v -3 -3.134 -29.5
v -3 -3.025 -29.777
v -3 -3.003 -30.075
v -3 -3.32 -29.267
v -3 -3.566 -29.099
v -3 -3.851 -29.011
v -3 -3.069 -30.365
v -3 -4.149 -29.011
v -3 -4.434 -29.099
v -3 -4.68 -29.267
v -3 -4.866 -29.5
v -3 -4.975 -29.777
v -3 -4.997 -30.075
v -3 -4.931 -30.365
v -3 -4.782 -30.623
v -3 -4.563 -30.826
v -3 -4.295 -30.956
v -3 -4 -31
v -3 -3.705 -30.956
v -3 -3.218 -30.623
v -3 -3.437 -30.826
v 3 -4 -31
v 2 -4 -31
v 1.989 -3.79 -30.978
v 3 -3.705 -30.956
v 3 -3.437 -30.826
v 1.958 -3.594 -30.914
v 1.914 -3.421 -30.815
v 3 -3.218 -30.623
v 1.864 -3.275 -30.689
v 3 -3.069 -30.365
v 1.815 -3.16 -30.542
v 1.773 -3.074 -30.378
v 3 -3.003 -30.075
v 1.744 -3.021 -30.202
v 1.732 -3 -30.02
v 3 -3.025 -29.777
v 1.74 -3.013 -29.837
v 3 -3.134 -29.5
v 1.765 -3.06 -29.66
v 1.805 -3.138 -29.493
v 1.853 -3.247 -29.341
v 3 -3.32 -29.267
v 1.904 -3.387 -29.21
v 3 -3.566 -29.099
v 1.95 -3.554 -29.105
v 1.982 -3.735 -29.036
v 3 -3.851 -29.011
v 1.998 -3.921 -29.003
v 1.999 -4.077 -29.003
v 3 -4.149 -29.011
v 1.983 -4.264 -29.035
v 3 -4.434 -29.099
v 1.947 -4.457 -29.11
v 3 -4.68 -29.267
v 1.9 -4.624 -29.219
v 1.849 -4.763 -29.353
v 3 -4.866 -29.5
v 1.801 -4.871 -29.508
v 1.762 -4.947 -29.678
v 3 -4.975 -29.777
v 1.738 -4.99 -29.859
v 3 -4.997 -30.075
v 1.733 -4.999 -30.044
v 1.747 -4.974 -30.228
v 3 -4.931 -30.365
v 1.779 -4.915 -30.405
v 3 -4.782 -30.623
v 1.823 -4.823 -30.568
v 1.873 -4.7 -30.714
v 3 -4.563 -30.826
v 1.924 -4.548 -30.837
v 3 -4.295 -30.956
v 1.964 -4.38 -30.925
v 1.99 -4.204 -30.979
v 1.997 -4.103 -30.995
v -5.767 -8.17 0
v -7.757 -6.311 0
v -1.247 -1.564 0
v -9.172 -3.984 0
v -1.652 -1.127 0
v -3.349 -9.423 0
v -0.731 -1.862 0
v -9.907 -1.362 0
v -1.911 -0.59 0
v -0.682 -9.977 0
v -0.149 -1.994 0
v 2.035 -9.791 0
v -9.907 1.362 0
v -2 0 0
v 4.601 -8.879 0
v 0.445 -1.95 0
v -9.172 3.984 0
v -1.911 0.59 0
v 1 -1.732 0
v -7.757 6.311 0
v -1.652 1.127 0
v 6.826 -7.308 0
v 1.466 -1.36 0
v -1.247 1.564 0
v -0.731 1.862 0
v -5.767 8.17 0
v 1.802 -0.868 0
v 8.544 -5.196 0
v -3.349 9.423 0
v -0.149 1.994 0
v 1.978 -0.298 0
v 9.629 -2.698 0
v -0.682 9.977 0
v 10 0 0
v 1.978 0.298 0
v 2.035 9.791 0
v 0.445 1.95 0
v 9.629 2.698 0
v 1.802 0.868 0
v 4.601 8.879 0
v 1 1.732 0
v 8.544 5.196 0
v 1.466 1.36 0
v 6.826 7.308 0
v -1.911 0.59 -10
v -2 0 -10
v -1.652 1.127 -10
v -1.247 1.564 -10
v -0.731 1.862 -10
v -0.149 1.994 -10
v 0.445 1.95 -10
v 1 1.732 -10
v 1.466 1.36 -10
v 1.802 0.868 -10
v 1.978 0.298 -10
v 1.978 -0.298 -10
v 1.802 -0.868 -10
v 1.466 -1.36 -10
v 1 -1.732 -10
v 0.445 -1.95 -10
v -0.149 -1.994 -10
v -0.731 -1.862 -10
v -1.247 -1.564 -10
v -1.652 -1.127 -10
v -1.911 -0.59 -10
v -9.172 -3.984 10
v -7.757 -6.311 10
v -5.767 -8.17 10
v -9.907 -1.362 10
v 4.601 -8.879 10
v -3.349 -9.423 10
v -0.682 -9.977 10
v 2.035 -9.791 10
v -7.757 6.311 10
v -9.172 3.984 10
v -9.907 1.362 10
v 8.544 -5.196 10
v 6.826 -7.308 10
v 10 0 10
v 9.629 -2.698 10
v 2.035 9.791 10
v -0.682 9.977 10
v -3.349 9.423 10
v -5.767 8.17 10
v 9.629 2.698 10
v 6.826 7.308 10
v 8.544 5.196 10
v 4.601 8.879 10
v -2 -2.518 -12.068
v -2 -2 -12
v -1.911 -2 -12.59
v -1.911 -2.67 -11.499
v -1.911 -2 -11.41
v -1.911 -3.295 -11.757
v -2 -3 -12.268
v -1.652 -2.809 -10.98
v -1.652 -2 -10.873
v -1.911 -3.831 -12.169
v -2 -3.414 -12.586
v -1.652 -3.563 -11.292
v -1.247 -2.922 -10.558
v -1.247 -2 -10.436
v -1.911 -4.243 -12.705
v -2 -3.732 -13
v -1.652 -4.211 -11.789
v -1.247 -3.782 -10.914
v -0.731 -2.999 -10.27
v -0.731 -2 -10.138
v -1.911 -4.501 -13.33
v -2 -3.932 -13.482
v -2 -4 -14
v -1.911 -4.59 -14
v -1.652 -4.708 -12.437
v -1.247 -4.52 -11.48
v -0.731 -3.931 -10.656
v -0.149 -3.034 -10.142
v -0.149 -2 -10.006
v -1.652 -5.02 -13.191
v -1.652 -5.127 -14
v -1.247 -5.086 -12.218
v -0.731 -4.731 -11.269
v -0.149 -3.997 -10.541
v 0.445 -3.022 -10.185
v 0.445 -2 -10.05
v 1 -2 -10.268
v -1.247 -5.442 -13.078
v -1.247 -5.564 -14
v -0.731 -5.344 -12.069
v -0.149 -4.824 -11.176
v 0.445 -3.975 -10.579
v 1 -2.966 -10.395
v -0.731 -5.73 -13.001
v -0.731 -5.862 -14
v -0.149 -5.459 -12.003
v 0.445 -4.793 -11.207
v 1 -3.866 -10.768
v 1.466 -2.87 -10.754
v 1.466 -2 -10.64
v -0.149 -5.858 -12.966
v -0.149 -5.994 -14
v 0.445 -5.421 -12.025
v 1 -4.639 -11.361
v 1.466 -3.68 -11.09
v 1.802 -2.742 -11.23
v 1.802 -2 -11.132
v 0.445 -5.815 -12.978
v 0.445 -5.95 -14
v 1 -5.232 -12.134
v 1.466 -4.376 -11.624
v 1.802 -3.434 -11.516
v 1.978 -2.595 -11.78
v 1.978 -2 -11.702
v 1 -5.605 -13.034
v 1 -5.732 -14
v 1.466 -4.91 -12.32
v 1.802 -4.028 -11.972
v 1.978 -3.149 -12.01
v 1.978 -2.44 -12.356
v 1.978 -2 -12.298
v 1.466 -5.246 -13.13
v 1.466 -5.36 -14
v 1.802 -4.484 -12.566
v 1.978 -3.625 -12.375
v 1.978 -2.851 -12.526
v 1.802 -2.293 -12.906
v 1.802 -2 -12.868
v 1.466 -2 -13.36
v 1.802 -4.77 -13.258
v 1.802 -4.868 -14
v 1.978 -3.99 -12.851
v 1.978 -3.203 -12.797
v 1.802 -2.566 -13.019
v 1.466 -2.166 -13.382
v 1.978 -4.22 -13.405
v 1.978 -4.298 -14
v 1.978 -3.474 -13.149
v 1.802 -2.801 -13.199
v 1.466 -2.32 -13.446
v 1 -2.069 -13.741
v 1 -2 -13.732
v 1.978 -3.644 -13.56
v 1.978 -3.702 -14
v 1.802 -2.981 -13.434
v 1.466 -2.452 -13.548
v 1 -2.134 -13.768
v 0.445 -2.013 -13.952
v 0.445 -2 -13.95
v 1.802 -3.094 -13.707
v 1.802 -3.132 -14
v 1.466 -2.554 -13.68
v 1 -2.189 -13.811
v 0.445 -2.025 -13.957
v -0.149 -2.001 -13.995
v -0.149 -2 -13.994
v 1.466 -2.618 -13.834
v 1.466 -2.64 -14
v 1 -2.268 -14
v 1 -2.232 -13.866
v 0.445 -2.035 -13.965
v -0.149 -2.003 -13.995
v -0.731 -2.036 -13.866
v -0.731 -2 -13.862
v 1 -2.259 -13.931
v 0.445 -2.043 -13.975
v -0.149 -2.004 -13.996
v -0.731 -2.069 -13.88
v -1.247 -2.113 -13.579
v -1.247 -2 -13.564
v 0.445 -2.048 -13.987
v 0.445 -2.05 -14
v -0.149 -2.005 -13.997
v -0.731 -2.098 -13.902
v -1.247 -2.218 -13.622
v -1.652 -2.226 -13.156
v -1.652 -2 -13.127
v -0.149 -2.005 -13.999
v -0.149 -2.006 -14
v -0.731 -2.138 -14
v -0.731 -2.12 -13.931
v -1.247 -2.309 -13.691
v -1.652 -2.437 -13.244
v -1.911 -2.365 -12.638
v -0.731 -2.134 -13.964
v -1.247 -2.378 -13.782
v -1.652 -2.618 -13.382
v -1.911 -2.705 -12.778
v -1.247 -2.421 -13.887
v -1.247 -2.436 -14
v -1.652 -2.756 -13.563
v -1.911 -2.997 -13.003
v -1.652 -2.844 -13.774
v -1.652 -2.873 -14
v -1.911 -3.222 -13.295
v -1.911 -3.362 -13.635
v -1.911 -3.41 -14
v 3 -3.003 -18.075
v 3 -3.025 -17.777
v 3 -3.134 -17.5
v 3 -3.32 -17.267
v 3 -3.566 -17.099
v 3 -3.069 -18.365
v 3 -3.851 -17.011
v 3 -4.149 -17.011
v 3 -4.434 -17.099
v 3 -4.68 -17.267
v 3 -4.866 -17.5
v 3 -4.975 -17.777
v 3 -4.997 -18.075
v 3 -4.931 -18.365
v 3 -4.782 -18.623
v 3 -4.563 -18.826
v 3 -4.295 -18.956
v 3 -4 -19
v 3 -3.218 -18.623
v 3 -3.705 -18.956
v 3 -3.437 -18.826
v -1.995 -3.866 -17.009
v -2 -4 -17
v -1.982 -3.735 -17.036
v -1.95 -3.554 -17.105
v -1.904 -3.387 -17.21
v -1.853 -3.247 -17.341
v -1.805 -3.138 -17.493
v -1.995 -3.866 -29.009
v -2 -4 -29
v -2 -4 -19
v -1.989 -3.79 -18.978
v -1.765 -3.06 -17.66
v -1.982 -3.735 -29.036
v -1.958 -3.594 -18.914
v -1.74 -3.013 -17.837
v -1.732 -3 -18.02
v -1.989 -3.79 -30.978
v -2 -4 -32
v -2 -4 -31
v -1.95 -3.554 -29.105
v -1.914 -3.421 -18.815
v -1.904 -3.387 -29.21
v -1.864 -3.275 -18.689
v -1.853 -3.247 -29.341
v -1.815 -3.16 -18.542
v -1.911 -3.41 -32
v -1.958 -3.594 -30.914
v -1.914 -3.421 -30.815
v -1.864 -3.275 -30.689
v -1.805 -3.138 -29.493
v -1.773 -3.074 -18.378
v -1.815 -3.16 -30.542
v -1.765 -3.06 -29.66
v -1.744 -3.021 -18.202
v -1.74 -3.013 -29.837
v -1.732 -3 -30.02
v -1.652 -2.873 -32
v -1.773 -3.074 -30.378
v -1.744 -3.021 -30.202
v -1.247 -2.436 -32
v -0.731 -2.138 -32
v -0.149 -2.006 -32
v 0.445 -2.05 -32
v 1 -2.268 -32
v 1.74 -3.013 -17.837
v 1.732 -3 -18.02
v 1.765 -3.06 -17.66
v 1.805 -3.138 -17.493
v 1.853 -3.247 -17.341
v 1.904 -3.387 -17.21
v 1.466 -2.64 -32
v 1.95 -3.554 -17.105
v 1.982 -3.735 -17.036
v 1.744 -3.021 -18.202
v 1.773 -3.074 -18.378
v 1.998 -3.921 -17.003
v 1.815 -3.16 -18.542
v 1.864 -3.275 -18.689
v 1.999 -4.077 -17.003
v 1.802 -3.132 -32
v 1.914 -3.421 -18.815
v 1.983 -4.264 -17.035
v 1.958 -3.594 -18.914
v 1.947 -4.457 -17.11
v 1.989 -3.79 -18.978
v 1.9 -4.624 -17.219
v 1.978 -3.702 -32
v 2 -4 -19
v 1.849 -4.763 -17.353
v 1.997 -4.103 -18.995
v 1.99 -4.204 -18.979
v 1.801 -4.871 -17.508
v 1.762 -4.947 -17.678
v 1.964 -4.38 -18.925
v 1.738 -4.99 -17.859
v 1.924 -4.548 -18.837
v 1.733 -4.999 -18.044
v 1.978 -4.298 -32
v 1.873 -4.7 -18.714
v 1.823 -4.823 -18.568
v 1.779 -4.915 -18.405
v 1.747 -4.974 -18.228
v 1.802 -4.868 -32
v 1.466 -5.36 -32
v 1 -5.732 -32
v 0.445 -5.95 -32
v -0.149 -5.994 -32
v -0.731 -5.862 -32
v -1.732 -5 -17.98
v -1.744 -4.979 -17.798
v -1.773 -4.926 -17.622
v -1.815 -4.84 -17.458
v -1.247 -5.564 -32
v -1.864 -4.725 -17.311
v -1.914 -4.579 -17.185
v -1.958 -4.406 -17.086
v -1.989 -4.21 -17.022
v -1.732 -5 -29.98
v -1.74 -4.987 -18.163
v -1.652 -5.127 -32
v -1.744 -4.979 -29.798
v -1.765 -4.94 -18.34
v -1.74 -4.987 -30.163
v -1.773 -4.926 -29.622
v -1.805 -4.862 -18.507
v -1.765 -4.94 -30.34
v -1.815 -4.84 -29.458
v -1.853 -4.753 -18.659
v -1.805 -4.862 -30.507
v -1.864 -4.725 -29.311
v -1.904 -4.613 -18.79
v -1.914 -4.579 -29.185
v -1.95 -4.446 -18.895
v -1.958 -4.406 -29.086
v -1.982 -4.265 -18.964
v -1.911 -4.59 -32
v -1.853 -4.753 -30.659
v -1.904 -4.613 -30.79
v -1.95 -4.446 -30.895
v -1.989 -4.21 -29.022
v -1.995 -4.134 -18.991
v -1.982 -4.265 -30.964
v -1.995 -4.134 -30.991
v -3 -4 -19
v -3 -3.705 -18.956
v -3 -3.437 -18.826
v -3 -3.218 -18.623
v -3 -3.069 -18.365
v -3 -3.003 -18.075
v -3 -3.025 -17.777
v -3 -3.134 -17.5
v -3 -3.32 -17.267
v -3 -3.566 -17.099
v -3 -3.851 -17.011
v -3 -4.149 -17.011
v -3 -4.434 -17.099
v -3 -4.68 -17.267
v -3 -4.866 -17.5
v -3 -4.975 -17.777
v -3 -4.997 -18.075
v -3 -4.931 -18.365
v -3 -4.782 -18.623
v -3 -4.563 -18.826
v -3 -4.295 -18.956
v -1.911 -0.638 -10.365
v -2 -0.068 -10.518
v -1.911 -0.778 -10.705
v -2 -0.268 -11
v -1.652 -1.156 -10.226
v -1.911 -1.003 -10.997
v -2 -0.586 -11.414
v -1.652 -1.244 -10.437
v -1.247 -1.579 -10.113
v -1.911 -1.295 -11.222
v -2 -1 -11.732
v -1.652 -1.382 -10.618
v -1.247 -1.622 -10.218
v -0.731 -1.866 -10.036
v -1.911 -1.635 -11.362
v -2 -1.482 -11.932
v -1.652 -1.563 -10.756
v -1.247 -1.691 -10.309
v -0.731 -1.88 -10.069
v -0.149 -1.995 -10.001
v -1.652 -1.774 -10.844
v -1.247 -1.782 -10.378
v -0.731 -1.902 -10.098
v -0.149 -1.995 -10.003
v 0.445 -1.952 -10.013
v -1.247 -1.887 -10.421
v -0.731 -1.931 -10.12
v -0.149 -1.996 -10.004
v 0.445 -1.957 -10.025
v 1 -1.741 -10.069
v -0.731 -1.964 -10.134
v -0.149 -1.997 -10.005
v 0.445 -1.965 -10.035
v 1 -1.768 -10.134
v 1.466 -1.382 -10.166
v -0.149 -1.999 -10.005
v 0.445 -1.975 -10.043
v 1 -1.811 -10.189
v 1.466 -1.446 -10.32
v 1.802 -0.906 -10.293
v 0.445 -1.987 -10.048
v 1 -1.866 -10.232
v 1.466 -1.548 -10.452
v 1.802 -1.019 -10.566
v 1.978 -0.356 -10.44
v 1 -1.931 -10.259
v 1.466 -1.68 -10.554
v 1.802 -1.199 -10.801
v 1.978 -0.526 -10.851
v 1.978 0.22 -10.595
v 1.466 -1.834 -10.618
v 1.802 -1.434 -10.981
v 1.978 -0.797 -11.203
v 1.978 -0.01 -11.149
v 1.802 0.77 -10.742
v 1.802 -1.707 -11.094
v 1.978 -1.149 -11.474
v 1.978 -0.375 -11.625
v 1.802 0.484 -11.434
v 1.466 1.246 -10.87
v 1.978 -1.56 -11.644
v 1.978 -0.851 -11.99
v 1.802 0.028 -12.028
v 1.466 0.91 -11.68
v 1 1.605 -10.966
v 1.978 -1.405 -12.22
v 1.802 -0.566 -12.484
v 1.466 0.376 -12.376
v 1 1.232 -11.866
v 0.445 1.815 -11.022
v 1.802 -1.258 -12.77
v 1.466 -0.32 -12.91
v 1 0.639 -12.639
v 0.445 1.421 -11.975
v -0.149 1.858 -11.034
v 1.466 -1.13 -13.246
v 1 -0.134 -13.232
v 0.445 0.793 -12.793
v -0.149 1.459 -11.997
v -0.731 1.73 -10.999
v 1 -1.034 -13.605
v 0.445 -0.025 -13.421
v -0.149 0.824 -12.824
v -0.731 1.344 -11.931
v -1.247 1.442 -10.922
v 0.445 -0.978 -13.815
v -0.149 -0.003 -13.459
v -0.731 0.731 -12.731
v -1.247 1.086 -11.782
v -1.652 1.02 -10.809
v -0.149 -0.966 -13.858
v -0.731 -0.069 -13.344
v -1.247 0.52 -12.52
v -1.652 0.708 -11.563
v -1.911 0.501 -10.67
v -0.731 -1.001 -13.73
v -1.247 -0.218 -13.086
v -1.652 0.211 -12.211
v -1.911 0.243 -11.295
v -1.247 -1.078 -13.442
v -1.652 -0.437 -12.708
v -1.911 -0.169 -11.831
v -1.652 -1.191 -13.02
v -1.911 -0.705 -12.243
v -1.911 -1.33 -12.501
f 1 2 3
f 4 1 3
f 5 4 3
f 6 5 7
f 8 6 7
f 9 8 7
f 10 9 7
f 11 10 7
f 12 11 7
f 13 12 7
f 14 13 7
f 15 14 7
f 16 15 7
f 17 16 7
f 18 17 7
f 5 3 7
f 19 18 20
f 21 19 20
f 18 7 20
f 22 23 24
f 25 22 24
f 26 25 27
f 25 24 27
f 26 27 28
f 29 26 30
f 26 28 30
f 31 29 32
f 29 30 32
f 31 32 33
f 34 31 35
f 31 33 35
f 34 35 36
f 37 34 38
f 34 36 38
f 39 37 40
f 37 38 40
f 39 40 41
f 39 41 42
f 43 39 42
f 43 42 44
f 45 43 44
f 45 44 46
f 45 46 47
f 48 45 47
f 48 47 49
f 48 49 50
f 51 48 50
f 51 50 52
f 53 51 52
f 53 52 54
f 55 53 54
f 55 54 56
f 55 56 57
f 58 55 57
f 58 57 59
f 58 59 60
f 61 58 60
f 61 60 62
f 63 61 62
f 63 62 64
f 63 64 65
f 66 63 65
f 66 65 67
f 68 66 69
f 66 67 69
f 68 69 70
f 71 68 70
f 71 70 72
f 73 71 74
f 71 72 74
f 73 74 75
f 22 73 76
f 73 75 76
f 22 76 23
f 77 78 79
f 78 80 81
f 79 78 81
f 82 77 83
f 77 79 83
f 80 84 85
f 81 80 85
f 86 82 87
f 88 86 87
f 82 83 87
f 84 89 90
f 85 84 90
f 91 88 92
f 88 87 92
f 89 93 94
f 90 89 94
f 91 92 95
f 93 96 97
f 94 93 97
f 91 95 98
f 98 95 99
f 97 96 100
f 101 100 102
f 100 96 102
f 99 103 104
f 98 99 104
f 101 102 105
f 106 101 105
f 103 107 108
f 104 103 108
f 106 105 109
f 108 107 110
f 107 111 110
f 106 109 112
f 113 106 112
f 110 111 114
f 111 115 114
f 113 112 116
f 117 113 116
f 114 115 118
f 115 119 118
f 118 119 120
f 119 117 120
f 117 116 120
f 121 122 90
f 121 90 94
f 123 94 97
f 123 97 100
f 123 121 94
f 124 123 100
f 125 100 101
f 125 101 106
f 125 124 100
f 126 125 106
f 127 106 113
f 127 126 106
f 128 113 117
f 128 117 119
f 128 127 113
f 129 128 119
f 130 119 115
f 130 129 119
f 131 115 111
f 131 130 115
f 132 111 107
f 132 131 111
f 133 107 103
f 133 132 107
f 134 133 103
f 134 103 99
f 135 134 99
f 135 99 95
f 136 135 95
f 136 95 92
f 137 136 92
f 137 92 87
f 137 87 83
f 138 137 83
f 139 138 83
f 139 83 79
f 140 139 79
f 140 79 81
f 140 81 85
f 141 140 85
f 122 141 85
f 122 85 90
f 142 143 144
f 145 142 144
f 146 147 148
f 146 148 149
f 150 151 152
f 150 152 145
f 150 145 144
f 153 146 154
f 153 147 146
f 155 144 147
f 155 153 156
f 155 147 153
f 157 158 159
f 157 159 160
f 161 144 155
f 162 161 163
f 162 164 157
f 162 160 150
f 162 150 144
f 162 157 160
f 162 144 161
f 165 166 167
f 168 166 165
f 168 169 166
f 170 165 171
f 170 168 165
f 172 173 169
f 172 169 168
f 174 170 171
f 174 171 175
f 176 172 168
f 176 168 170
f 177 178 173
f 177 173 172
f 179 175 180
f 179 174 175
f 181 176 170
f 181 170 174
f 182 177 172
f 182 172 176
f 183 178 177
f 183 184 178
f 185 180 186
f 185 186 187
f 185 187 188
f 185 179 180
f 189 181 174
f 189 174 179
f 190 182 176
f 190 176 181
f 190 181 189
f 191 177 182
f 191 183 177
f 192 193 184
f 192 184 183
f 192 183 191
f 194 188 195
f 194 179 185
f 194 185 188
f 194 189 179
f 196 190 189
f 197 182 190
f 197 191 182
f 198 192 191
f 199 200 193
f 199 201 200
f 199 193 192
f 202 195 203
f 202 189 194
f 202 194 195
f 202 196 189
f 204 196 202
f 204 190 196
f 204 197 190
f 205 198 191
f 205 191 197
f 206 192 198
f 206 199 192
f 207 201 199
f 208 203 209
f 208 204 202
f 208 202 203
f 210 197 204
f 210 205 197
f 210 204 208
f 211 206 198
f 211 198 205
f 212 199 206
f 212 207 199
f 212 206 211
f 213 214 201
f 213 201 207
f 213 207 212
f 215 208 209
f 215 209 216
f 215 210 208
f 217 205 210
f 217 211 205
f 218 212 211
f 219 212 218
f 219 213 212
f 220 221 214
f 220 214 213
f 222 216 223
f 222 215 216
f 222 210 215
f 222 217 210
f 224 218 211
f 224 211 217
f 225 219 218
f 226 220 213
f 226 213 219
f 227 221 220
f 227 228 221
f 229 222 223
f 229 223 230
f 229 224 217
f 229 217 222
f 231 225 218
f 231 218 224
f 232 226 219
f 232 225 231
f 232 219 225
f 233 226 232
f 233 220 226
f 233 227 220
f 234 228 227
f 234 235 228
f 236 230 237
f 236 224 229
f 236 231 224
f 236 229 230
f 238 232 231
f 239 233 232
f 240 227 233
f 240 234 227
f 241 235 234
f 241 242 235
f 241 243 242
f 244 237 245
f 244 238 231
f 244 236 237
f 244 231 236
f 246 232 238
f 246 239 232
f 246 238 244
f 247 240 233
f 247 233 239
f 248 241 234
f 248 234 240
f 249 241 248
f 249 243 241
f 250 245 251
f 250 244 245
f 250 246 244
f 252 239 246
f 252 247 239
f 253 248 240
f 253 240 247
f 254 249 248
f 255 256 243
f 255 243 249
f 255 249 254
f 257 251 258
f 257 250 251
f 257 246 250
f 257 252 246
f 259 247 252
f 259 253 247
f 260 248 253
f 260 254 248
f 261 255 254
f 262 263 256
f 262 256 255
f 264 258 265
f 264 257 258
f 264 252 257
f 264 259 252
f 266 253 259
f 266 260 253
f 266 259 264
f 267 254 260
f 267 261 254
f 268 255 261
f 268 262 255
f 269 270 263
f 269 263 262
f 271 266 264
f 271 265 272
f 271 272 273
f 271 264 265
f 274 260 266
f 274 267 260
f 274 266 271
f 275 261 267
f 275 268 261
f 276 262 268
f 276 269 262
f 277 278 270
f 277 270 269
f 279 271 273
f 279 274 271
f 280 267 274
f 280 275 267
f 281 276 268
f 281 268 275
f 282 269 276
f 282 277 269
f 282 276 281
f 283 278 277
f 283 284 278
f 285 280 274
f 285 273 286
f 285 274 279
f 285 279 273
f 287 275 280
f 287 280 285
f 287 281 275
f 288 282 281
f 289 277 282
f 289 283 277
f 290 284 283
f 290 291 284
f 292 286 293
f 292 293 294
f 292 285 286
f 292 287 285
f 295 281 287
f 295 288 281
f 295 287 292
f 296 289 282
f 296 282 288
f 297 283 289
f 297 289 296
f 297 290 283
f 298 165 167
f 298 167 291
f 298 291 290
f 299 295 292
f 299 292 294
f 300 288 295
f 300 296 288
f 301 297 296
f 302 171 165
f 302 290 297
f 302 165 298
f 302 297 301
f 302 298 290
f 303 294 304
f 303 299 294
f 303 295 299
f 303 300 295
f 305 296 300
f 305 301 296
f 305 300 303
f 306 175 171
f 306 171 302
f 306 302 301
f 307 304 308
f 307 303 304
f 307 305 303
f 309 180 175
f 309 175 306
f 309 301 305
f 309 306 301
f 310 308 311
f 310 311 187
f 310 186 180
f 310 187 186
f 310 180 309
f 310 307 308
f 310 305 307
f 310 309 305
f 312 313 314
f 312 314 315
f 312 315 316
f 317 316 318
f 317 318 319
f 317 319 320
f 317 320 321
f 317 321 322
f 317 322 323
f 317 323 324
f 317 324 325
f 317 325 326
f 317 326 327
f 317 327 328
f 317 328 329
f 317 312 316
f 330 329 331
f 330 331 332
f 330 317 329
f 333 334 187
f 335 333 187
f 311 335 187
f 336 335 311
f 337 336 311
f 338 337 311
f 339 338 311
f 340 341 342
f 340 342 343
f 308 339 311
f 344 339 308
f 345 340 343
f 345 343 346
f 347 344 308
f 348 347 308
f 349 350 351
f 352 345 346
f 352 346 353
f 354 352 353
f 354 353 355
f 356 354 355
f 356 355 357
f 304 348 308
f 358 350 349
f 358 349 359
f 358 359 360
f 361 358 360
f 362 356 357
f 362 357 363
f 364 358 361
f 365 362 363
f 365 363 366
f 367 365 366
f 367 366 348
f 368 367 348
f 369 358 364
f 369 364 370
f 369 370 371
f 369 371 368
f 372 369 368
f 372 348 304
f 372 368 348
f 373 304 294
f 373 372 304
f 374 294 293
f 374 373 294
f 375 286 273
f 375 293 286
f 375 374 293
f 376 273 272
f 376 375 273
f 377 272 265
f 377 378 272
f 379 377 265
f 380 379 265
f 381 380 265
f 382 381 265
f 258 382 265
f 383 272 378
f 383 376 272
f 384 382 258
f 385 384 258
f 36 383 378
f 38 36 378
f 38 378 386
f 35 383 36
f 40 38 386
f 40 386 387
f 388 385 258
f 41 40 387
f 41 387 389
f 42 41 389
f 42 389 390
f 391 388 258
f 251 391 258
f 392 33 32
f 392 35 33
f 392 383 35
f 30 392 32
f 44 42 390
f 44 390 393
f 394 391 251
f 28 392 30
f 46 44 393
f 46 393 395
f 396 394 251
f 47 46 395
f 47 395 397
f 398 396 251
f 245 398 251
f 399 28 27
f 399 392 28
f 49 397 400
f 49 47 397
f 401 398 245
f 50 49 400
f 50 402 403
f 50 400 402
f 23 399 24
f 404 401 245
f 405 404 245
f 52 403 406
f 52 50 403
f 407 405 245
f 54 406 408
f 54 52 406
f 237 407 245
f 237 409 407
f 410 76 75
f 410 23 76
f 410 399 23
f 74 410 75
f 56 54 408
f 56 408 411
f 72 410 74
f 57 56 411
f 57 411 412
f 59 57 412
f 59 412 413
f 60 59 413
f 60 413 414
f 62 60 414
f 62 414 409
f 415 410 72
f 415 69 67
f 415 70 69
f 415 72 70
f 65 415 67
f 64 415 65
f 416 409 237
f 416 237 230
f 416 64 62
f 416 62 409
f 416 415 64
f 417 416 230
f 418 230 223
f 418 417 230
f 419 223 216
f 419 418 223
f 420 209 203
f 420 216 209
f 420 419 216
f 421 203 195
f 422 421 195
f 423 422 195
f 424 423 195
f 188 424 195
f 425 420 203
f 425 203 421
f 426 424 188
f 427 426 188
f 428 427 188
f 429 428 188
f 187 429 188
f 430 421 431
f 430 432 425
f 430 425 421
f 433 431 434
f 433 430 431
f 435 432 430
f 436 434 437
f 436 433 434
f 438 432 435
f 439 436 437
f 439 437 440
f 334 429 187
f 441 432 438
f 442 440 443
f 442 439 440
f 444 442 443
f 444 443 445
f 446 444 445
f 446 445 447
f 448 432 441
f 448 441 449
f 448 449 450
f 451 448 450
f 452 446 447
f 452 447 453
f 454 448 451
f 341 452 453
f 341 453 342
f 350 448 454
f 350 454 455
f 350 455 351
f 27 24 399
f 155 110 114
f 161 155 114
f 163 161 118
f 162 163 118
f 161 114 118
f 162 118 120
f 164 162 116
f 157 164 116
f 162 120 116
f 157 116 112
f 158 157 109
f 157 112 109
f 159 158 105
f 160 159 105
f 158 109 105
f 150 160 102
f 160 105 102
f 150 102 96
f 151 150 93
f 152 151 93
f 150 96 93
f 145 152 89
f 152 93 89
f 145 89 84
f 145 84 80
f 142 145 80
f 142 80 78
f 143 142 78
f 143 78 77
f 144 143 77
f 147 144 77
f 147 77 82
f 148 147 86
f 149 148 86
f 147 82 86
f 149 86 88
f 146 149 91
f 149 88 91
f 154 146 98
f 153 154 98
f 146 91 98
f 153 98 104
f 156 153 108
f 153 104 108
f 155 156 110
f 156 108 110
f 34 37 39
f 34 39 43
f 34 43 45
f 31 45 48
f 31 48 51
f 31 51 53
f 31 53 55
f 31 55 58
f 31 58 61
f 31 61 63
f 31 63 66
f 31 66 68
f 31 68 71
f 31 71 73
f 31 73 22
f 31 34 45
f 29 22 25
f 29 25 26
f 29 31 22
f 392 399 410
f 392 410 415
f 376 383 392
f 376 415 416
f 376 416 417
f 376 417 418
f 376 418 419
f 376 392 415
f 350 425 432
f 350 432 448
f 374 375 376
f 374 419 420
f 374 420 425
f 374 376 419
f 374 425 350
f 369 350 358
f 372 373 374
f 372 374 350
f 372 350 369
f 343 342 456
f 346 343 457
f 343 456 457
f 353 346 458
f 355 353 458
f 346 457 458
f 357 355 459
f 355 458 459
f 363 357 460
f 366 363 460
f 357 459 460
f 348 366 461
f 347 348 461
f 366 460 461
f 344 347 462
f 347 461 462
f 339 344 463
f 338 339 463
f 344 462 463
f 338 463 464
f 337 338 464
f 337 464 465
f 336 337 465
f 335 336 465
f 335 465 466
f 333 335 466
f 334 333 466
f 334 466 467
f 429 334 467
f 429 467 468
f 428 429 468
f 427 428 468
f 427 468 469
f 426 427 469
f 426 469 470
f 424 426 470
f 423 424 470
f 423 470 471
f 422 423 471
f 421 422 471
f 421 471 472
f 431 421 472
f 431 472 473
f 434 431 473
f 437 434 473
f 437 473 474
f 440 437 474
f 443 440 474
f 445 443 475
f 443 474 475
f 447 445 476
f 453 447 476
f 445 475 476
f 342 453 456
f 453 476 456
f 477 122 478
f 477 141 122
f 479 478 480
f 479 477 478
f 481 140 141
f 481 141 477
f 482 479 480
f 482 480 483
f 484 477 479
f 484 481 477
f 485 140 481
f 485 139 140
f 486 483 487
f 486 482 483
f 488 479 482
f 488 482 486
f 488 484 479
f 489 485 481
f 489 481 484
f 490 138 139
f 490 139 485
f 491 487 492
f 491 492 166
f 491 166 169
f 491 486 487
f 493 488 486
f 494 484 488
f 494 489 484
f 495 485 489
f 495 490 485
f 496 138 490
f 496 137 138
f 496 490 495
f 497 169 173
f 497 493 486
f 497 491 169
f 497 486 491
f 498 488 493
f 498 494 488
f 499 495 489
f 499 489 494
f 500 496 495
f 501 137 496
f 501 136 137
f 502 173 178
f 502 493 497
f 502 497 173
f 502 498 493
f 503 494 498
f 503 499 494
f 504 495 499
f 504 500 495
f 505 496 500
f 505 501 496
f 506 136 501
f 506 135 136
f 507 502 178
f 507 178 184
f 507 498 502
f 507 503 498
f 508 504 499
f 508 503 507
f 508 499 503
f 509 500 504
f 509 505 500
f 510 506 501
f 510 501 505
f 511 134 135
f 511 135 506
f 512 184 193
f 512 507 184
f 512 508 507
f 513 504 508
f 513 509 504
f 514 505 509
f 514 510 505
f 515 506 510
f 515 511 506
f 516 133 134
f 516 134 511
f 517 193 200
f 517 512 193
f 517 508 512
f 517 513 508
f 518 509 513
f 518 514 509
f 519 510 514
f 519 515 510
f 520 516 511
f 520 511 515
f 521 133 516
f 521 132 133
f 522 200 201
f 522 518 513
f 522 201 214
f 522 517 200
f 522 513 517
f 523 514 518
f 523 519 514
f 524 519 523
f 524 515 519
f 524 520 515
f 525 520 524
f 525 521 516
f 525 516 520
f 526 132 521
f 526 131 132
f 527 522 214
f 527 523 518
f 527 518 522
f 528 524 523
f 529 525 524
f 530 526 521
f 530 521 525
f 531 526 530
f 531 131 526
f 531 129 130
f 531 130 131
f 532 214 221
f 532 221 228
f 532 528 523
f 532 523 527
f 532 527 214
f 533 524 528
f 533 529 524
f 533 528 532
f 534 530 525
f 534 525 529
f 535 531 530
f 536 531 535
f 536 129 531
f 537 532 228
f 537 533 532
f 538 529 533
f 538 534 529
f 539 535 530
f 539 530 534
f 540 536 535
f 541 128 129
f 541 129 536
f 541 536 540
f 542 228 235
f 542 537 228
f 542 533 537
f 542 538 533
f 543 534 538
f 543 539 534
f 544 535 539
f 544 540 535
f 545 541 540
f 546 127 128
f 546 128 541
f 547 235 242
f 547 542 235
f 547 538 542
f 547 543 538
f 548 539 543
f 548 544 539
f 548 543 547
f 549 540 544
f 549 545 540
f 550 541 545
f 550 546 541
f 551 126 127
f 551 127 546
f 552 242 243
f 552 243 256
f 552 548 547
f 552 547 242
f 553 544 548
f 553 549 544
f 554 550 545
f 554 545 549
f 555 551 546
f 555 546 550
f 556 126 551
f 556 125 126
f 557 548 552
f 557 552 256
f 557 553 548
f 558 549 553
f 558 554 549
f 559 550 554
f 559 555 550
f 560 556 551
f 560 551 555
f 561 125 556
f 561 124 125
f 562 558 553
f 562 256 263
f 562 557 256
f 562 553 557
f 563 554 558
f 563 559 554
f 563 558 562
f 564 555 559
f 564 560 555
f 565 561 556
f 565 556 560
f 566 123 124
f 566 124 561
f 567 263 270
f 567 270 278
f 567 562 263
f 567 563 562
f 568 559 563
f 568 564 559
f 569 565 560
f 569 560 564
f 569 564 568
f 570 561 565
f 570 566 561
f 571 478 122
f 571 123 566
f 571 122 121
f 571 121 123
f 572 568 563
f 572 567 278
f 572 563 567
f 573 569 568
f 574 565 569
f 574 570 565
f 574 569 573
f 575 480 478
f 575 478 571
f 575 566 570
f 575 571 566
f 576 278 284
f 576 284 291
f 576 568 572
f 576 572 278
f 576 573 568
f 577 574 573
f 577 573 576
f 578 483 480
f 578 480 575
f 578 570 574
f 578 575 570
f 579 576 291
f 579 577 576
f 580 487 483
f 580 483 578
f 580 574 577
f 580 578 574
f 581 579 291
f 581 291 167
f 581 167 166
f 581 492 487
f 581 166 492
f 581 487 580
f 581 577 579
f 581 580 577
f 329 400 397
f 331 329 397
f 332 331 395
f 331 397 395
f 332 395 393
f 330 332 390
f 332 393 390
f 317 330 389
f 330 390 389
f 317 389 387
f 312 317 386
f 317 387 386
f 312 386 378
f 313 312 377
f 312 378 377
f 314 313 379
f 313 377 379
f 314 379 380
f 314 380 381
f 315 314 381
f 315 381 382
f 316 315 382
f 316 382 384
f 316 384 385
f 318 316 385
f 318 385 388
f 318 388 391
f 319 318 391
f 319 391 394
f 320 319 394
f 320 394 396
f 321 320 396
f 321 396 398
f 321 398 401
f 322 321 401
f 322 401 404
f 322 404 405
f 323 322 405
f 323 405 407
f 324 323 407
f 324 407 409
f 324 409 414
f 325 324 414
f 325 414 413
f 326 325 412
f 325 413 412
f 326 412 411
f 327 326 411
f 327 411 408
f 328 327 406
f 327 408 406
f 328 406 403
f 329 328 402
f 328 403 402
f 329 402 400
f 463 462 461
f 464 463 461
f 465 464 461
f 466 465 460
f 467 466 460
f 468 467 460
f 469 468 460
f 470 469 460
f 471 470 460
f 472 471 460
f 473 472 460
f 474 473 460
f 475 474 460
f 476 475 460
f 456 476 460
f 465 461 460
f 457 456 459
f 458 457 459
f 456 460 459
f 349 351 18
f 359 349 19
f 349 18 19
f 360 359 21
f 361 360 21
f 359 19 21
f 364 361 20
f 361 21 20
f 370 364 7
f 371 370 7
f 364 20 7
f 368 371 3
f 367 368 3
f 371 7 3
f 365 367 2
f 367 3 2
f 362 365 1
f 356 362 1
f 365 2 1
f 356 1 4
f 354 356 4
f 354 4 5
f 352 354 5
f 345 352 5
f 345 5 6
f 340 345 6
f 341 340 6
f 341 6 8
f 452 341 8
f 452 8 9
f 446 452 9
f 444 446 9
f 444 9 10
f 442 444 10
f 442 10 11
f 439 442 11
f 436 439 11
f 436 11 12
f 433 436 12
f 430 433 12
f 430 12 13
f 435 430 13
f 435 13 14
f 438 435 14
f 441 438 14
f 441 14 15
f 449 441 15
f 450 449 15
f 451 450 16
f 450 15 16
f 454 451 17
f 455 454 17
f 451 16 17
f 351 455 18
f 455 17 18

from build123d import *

# Parameters (mm, degrees)
ESQUISSE1_R             = 10
BOSS_EXTRU_1_DEPTH      = 10
ESQUISSE2_R             = 2
BOSS_EXTRU_2_DEPTH      = 3
BOSS_EXTRU_2_DEPTH_BACK = 3
ESQUISSE4_R             = 1


with BuildPart() as part:
    # Esquisse1 → Boss.-Extru.1 (new body)
    with BuildSketch(Plane.XY):
        Circle(ESQUISSE1_R)
    extrude(amount=BOSS_EXTRU_1_DEPTH)

    # Balayage1: sweep along a path in Esquisse3
    with BuildLine(Plane(origin=(0, 0, 0), x_dir=(0, 0, -1), z_dir=(1, 0, 0))) as balayage1_path:
        Line((0, 0), (10, 0))
        ThreePointArc((10, 0), (11.414213562, -0.585786438), (12, -2))
        ThreePointArc((12, -2), (12.585786438, -3.414213562), (14, -4))
        Line((14, -4), (32, -4))
    # Esquisse2 → Balayage1 (sweep)
    with BuildSketch(Plane(origin=(0, 0, 0), x_dir=(-1, 0, 0), z_dir=(0, 0, -1))):
        Circle(ESQUISSE2_R)
    sweep(path=balayage1_path.line)

    # Esquisse4 → Boss.-Extru.2 (add, two sides: drawn at the far end of the back side and taken through both)
    with BuildSketch(Plane(origin=(0, 0, 0), x_dir=(0, 0, -1), z_dir=(1, 0, 0)).offset(-BOSS_EXTRU_2_DEPTH_BACK)):
        with Locations((18, -4)):
            Circle(ESQUISSE4_R)
        with Locations((30, -4)):
            Circle(ESQUISSE4_R)
    extrude(amount=BOSS_EXTRU_2_DEPTH + BOSS_EXTRU_2_DEPTH_BACK)


solid = part.part
